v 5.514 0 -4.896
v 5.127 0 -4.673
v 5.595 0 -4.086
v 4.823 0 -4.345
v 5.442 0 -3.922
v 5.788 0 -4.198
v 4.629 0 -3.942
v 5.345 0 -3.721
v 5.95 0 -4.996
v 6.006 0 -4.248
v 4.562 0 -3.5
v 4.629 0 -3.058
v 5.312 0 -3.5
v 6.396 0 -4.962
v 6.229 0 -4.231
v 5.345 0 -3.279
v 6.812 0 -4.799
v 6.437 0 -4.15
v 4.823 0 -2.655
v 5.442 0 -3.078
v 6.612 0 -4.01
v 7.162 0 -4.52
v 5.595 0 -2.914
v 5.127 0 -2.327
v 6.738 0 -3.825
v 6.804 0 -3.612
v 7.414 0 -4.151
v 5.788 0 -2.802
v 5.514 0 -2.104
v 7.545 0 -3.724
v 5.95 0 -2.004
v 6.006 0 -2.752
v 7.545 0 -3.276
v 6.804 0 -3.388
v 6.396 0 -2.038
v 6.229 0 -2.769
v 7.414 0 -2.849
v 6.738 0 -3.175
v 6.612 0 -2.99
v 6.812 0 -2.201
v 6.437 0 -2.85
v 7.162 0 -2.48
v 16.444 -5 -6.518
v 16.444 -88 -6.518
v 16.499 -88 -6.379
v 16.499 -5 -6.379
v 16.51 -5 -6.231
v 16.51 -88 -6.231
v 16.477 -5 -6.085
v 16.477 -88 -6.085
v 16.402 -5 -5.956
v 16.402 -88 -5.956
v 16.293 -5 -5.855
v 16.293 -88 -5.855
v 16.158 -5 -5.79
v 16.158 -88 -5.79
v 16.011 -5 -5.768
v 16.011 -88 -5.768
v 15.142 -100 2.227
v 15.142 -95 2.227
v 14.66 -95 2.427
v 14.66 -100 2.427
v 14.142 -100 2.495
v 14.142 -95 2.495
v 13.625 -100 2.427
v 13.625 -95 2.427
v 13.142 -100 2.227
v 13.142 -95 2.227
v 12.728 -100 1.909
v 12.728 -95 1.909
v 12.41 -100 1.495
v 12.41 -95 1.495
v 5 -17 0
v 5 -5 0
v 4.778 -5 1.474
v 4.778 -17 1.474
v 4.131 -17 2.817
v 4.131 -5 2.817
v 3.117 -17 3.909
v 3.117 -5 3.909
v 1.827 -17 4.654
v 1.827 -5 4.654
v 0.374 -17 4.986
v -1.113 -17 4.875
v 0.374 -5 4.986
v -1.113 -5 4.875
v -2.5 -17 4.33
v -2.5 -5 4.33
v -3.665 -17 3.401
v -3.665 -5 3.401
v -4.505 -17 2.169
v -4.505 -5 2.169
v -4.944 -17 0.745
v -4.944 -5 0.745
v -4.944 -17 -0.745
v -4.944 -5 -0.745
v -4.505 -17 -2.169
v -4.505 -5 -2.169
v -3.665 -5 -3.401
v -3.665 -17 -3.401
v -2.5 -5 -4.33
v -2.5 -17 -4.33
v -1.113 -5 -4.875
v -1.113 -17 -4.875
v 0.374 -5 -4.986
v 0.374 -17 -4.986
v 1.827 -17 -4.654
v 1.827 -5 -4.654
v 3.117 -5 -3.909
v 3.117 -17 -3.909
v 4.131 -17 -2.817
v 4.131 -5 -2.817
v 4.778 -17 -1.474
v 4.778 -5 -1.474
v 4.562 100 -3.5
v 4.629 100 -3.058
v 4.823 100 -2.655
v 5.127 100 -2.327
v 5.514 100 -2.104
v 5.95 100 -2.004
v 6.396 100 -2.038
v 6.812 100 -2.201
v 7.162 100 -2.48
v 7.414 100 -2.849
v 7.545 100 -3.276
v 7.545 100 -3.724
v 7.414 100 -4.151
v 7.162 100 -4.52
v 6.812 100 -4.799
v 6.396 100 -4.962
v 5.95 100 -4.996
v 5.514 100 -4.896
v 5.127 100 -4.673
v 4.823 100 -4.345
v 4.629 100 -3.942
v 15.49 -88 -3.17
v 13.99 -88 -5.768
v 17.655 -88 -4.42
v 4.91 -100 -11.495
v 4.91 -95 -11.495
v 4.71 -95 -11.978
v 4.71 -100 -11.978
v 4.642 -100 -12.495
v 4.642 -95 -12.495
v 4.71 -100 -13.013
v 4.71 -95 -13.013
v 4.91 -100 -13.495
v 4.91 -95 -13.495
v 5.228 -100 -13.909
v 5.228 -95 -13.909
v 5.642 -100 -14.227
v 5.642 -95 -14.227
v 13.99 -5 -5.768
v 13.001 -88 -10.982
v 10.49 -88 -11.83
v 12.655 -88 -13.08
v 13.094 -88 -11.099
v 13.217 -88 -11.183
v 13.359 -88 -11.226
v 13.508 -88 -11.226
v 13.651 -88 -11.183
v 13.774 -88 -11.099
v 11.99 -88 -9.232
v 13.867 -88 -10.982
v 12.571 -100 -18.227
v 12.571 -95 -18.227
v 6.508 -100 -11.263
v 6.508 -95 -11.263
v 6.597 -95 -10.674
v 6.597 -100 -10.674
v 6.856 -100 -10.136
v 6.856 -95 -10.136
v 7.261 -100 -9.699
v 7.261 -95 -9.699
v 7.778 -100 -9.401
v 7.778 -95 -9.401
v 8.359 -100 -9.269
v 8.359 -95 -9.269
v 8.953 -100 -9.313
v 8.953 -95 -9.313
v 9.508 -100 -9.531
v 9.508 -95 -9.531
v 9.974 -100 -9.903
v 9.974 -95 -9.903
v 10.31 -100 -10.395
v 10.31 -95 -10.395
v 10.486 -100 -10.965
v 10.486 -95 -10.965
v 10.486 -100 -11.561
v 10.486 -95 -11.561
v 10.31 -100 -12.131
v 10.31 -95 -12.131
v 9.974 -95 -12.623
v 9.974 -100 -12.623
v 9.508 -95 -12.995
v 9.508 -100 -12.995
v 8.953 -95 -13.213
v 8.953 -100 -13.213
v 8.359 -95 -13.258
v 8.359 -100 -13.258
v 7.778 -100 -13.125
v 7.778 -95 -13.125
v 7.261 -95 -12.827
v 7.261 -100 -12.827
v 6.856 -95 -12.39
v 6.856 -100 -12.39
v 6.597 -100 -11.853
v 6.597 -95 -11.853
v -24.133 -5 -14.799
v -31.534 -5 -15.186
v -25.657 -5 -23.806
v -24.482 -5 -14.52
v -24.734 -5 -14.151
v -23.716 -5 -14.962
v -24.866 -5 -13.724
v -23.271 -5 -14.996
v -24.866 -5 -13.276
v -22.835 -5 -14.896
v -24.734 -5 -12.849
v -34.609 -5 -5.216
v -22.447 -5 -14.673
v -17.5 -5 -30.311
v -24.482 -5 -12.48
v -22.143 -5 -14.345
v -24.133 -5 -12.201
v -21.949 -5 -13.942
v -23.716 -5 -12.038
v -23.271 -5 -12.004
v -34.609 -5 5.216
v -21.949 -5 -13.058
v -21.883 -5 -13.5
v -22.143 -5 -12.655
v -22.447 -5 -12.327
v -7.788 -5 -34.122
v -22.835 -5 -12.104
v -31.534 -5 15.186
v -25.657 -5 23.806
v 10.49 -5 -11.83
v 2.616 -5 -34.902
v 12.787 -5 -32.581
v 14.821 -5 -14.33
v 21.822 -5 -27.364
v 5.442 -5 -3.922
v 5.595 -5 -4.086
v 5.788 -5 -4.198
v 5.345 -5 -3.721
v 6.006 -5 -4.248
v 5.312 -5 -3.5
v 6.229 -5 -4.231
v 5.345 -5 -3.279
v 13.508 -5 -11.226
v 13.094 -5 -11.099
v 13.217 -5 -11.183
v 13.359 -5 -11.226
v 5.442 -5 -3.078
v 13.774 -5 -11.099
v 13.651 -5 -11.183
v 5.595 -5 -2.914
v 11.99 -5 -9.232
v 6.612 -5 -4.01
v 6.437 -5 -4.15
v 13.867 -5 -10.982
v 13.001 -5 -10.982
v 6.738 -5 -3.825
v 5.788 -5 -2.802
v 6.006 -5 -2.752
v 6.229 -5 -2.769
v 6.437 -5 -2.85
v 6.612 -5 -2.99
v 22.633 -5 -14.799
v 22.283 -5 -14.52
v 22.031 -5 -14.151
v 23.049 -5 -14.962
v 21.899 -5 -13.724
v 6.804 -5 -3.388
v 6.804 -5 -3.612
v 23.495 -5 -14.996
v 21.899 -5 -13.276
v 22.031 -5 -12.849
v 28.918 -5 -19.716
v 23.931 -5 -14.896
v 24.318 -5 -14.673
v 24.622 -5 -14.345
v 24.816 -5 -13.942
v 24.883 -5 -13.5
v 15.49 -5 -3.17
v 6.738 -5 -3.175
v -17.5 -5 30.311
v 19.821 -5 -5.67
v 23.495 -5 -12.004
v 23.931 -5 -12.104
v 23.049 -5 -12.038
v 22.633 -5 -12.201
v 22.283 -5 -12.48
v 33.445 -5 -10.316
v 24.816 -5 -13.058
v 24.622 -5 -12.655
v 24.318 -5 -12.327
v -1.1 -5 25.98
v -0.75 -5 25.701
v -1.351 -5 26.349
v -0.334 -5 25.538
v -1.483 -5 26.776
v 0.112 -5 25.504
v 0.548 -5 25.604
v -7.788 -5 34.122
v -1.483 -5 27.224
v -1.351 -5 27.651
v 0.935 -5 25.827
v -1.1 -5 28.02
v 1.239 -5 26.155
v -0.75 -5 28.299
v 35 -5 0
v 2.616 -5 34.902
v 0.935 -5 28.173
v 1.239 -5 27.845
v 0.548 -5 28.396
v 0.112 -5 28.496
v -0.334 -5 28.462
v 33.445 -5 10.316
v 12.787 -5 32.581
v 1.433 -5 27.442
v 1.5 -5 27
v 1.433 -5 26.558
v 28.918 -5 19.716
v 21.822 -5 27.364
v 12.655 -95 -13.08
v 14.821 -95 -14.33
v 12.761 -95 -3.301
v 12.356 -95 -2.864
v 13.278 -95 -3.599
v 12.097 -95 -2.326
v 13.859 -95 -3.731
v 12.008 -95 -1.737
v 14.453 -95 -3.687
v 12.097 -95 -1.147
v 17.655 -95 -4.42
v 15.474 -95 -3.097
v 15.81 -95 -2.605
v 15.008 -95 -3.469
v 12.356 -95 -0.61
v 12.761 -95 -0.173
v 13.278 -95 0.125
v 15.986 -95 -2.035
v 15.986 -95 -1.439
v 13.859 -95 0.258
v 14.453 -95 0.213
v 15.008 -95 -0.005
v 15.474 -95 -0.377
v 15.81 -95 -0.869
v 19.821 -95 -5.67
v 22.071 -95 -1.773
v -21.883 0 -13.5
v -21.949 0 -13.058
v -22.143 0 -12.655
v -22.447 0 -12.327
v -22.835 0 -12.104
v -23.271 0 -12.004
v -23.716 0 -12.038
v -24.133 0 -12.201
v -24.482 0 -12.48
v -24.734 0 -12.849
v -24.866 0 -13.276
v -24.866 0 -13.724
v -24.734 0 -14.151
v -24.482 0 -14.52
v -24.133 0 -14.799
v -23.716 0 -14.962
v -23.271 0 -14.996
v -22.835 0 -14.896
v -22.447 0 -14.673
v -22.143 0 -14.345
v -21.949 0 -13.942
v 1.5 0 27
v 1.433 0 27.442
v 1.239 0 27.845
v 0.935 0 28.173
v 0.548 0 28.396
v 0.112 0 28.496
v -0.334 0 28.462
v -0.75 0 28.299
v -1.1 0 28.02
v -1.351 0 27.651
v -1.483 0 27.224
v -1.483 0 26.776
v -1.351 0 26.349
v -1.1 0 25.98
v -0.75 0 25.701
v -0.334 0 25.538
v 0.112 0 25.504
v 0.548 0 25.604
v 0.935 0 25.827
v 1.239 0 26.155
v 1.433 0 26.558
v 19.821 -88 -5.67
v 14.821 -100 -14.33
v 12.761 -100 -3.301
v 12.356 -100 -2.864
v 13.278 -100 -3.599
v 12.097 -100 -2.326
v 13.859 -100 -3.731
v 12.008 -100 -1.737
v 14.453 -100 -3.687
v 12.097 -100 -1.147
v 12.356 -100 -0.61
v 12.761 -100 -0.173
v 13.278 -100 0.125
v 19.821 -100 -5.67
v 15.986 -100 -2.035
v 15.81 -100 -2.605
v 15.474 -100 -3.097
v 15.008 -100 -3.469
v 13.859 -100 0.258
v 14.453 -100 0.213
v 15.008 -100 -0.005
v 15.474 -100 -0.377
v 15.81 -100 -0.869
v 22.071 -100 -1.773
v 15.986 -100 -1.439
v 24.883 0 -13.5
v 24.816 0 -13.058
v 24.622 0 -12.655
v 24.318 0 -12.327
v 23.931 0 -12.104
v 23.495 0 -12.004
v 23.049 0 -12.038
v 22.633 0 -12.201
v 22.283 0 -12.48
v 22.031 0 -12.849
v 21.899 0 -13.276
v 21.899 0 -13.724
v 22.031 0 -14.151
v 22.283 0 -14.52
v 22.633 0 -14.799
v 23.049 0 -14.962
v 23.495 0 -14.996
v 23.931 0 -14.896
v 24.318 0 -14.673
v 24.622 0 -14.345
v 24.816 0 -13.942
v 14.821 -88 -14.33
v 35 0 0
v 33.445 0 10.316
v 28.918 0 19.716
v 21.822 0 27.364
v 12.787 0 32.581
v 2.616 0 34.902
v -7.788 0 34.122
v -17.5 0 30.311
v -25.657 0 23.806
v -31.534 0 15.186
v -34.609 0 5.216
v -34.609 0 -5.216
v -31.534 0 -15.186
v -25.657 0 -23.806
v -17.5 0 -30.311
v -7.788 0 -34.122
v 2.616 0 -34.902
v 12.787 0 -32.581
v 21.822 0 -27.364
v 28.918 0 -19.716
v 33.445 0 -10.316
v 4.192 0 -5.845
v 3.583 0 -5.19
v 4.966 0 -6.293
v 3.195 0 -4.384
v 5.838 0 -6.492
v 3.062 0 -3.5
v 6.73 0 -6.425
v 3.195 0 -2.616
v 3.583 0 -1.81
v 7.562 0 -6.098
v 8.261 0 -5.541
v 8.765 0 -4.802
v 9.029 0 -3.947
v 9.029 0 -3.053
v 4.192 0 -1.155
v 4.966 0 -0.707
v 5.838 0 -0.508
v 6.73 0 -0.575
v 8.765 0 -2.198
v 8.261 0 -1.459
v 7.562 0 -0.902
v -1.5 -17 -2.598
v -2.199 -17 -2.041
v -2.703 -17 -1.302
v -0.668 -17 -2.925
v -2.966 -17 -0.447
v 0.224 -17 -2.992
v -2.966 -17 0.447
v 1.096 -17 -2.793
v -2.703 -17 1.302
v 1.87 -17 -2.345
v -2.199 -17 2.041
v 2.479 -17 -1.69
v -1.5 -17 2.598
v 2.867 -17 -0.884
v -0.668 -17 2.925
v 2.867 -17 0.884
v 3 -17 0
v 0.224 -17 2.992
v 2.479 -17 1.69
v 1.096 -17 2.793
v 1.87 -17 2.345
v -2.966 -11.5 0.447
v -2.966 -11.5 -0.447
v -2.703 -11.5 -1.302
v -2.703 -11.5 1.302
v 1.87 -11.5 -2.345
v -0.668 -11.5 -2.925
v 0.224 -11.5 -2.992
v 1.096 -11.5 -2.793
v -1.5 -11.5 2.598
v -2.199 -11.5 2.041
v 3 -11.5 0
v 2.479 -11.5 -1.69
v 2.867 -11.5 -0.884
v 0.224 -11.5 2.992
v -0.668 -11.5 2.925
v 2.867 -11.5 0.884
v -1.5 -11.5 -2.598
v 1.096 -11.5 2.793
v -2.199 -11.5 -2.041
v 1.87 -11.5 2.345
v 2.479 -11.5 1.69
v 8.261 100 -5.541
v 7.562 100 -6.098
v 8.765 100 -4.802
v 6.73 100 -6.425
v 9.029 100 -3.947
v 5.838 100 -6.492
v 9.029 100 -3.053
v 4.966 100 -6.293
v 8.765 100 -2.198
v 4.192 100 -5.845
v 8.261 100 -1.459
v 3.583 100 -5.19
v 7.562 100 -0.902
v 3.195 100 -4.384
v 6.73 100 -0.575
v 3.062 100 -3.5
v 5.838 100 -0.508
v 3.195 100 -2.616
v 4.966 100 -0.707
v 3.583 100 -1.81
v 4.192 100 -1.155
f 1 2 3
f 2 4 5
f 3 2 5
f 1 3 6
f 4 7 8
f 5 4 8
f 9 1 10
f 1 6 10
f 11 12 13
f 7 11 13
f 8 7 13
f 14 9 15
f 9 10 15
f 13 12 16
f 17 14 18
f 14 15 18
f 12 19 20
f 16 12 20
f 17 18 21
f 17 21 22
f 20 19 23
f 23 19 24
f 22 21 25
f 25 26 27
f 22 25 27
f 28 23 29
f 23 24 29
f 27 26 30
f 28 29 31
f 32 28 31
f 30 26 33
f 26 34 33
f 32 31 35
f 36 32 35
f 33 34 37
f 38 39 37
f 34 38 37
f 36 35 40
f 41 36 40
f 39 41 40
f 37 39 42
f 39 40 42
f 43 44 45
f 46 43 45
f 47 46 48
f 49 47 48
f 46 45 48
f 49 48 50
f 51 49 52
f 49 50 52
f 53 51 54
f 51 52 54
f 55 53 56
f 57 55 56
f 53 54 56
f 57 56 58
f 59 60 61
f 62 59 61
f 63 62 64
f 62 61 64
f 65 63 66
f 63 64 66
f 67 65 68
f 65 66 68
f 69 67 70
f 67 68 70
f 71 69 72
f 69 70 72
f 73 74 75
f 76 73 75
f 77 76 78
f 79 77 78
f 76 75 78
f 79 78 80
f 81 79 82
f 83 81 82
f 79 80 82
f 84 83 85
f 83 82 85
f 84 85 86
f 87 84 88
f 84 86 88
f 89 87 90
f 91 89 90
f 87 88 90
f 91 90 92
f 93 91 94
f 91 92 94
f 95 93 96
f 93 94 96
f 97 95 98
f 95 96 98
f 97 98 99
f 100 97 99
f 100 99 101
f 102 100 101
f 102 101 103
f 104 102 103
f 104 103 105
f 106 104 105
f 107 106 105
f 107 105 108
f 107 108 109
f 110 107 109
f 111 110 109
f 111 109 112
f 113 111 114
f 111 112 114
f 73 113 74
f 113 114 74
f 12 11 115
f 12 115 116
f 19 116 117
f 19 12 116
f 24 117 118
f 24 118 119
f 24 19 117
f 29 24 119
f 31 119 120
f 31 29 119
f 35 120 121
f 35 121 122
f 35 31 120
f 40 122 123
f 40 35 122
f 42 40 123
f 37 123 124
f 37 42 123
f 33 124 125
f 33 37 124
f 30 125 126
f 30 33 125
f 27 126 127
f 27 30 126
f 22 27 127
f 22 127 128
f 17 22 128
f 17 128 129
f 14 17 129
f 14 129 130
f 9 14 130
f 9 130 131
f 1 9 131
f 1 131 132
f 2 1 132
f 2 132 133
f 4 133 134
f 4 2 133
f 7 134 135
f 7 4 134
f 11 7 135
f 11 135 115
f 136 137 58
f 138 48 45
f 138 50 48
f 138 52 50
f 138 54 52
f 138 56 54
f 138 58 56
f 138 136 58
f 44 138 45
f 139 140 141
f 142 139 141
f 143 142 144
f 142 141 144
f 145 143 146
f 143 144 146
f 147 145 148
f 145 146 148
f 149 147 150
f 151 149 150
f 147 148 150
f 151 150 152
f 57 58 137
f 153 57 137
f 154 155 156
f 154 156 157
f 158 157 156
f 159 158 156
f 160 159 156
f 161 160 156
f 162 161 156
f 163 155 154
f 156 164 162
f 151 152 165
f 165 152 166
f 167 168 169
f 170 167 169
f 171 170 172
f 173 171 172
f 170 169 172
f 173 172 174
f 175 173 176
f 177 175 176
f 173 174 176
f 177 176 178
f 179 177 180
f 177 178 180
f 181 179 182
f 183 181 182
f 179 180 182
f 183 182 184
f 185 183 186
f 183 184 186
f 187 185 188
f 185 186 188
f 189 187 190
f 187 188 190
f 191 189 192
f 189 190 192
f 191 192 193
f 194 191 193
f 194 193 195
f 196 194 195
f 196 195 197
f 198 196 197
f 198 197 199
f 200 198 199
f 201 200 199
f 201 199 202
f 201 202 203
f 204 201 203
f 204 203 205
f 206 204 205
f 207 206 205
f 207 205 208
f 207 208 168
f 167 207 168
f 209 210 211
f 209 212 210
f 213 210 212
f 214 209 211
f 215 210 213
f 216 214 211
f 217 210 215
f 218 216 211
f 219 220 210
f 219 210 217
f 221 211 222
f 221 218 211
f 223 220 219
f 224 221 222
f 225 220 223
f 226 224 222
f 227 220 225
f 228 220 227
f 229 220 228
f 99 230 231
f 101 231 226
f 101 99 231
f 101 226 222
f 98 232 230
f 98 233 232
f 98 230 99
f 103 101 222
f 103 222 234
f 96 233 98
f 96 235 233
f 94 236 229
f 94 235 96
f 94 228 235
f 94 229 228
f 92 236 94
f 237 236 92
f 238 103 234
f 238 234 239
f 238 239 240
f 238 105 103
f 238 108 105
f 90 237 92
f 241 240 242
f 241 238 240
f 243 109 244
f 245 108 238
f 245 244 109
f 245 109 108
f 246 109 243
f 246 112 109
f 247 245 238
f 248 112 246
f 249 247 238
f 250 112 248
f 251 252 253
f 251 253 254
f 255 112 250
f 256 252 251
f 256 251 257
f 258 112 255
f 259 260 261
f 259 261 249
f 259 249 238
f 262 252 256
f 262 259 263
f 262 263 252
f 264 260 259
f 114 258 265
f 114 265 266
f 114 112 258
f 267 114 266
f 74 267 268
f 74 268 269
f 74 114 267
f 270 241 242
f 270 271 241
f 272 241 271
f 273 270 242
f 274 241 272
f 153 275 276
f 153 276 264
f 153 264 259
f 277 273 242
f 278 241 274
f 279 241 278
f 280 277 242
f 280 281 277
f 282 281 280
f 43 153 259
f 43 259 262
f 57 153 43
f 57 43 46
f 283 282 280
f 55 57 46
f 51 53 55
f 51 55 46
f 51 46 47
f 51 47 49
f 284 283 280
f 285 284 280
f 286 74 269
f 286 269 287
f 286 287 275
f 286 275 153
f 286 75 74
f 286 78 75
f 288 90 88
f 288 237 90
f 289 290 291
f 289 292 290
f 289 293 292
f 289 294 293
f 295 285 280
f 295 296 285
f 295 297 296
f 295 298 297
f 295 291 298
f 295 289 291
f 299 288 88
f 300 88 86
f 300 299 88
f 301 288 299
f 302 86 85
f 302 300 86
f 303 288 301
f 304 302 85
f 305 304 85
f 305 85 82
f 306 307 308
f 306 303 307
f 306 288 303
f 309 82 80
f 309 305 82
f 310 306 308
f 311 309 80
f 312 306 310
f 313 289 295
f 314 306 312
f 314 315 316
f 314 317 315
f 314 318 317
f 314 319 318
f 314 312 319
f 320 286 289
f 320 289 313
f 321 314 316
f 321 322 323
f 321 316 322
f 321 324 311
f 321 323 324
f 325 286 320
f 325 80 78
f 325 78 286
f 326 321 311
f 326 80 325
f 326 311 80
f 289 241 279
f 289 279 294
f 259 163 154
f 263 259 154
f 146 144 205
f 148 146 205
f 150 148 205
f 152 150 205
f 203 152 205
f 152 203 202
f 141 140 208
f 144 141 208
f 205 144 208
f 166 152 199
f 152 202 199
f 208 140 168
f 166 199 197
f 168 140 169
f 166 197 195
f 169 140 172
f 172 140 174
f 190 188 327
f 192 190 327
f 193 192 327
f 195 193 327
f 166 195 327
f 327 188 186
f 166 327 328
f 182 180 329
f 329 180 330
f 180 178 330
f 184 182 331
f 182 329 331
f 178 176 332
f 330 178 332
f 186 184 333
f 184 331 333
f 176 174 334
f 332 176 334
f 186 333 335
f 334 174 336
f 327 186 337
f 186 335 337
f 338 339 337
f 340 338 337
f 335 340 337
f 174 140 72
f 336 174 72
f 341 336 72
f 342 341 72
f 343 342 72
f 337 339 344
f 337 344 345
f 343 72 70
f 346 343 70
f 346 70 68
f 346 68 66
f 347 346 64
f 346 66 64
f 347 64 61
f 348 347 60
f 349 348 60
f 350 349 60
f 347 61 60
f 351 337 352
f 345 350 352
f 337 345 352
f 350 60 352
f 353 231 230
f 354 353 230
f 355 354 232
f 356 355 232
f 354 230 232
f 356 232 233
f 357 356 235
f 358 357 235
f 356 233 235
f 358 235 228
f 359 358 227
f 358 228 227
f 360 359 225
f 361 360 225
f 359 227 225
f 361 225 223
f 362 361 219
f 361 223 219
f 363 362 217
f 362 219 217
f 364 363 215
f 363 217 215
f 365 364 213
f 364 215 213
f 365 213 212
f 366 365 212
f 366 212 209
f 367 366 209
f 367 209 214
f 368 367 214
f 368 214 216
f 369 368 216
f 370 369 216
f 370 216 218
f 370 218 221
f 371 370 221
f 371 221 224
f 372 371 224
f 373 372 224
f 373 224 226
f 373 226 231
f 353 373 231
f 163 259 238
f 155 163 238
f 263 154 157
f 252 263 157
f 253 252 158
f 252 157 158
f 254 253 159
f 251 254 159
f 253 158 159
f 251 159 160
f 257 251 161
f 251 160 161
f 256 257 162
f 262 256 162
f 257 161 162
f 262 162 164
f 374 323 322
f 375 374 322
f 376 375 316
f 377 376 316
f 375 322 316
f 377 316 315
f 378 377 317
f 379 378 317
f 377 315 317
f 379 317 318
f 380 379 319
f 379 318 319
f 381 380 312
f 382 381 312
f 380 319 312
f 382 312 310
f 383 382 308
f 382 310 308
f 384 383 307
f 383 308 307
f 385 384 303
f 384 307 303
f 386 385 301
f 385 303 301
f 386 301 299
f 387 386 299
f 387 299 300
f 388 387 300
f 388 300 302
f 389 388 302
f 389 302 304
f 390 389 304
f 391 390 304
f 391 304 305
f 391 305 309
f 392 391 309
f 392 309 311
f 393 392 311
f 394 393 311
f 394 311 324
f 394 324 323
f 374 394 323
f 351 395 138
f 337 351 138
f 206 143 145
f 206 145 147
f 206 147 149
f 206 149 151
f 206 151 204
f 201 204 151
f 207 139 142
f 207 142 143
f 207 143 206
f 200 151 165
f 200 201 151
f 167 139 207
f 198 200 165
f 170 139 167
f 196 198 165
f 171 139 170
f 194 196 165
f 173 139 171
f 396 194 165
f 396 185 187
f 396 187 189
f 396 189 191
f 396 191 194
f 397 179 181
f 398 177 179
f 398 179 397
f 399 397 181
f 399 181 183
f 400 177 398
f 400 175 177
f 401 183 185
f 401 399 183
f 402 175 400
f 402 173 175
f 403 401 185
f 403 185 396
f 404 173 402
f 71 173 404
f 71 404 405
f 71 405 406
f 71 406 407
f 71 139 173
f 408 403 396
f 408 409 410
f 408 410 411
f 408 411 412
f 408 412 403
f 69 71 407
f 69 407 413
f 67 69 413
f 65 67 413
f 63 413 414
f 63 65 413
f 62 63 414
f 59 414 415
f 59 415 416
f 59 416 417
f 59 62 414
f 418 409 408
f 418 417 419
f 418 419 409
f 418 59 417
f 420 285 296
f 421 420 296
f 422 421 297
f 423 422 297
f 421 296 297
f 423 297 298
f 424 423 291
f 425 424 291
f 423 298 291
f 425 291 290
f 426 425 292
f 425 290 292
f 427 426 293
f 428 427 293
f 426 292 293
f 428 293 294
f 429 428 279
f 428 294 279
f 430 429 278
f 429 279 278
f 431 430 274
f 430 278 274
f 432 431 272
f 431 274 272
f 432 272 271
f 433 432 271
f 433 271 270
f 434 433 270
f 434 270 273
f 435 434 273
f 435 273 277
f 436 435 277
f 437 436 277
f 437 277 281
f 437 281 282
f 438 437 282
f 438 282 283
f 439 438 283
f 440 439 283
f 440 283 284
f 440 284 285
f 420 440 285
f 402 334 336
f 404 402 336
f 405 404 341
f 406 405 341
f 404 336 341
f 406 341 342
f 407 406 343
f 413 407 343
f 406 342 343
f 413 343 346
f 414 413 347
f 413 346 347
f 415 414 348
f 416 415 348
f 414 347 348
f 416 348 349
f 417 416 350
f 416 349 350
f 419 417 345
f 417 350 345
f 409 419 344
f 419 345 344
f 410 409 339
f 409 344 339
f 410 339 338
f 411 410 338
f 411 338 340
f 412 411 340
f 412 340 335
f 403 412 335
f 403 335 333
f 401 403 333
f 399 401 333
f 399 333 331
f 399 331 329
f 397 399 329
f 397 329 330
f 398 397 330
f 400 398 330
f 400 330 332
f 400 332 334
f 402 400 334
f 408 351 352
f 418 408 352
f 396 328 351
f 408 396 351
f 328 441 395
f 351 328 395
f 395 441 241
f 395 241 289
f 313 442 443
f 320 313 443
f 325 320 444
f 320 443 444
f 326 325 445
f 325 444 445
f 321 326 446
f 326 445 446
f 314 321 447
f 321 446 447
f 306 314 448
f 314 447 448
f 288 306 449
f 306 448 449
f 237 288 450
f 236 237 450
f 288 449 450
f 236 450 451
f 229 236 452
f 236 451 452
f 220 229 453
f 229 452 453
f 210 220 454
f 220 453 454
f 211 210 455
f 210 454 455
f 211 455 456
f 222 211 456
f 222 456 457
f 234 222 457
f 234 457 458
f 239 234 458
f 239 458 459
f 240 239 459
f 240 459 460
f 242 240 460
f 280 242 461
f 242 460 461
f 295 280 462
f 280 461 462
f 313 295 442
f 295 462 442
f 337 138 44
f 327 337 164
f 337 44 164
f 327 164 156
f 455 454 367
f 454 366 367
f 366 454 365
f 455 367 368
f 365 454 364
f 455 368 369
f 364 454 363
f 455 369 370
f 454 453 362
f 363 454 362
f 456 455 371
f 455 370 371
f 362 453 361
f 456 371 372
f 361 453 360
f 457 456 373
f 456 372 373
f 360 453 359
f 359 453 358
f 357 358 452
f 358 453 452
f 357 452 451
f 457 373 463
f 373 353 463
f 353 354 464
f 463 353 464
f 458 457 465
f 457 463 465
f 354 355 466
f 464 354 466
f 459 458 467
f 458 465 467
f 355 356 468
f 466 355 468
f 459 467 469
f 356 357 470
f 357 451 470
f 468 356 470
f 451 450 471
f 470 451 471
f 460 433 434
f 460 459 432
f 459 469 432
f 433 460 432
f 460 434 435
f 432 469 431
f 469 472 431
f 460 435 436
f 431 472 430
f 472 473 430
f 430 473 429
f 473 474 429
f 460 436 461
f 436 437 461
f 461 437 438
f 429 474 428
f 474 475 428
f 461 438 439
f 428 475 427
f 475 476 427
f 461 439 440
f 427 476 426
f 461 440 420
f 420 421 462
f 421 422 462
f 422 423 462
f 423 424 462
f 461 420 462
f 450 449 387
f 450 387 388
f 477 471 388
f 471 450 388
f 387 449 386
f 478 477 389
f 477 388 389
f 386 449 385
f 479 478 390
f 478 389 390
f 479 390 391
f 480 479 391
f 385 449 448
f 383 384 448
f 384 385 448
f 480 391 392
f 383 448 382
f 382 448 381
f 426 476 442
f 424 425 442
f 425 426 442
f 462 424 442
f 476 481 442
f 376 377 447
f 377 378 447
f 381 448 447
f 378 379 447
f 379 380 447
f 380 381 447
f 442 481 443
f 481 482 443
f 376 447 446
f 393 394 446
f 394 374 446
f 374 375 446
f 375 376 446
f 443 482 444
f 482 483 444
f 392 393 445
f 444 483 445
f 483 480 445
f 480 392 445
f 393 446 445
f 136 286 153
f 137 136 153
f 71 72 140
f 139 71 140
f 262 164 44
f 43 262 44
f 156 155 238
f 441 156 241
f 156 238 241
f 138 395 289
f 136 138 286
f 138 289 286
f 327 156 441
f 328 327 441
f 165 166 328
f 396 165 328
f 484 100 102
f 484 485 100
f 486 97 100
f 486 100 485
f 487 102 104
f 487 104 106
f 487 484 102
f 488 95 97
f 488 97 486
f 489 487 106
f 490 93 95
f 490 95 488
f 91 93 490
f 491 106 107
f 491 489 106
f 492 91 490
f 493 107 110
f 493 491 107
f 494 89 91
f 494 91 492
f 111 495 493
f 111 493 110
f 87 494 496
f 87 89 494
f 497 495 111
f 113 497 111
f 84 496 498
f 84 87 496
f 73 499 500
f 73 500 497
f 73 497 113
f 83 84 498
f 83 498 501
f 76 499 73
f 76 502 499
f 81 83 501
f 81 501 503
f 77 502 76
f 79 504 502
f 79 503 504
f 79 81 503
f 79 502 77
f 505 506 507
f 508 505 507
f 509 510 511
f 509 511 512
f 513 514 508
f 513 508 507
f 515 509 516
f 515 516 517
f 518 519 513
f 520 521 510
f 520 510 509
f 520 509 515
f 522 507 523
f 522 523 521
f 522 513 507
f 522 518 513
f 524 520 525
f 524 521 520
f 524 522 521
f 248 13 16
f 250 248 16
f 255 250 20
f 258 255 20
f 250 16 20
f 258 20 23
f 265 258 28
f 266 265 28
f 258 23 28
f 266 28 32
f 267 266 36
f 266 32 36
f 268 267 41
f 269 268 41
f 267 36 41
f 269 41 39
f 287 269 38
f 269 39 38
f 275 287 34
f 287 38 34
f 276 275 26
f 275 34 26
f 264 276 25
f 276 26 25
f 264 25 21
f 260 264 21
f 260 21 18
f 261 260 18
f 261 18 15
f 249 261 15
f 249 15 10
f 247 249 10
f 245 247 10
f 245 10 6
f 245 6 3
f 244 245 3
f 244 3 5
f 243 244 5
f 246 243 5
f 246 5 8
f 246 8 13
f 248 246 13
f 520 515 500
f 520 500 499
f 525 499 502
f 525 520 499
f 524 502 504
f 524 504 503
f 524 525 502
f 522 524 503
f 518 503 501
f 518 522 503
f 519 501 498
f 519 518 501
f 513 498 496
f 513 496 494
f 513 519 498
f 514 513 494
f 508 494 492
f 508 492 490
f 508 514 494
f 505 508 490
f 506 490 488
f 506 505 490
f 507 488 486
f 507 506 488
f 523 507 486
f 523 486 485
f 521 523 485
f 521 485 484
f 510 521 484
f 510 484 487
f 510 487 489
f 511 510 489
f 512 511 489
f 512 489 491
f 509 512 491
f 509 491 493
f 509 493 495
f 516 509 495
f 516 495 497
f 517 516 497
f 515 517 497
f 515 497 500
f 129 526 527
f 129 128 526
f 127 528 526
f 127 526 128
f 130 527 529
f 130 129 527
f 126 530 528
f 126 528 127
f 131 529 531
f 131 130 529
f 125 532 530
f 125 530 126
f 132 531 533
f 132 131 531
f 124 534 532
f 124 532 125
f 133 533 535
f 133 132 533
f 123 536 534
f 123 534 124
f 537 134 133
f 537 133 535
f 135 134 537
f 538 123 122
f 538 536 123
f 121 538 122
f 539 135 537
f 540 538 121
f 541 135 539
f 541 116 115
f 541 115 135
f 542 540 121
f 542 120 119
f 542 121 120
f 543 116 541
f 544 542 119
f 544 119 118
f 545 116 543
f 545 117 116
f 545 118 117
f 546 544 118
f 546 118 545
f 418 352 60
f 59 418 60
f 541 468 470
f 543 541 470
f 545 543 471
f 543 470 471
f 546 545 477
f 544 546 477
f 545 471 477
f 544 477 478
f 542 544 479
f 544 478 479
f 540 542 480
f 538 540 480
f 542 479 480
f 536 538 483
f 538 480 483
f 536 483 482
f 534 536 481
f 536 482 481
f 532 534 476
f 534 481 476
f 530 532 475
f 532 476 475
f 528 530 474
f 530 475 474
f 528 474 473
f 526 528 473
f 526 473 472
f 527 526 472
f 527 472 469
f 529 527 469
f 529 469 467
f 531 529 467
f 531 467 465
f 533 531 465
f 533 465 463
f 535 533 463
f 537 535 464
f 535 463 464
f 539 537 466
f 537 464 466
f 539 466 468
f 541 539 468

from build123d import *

# Parameters (mm, degrees)
F0_R      = 35
F1_DEPTH  = 5
F2_R      = 5
F2_R_2    = 3
F3_DEPTH  = 12
F5_DEPTH  = 83
F7_D      = 3
F7_DEPTH  = 6
F7_TIP    = 0.9012909285
F9_DEPTH  = 83
F10_R     = 3
F11_DEPTH = 6.5
F13_DEPTH = 7
F15_DEPTH = 5
F17_D     = 4
F17_DEPTH = 10
F17_TIP   = 1.2017212381
F19_D     = 1.5
F19_DEPTH = 10
F19_TIP   = 0.4506454643
F20_R     = 3
F20_R_2   = 1.5
F21_DEPTH = 100


# Not quite as in the source:
# - a feature names something its author has since deleted; it is built from what else it names


with BuildPart() as f1:
    # F0 (on Front) → F1 (new body)
    with BuildSketch(Plane.XZ):
        Circle(F0_R)
    extrude(amount=F1_DEPTH)

    # F2 (on face) → F3 (join)
    with BuildSketch(Plane.XZ.offset(5)):
        Circle(F2_R)
        Circle(F2_R_2, mode=Mode.SUBTRACT)
    extrude(amount=F3_DEPTH)

    # F4 (on face) → F5 (join)
    with BuildSketch(Plane.XZ.offset(5)):
        Polygon((14.8205080757, -14.3301270189), (19.8205080757, -5.6698729811), (15.4903810568, -3.1698729811), (10.4903810568, -11.8301270189), align=None)
    extrude(amount=F5_DEPTH)

    # F7
    with Locations(Plane(origin=(0, 0, 0), x_dir=(-1, 0, 0), z_dir=(0, 1, 0))):
        with Locations((0, 27), (-23.3826859022, -13.5), (23.3826859022, -13.5)):
            Hole(F7_D / 2, depth=F7_DEPTH)
            with Locations((0, 0, -(F7_DEPTH + F7_TIP / 2))):  # 118° drill point
                Cone(0, F7_D / 2, F7_TIP, mode=Mode.SUBTRACT)

    # F8 (on face) → F9 (cut, through all)
    with BuildSketch(Plane.XZ.offset(88)):
        with BuildLine():
            Line((13.9903810568, -5.7679491924), (11.9903810568, -9.2320508076))
            Line((11.9903810568, -9.2320508076), (13.0007440278, -10.9820508076))
            ThreePointArc((13.0007440278, -10.9820508076), (13.4337567297, -11.2320508076), (13.8667694316, -10.9820508076))
            Line((13.8667694316, -10.9820508076), (16.4441197008, -6.5179491924))
            ThreePointArc((16.4441197008, -6.5179491924), (16.4441197008, -6.0179491924), (16.0111069989, -5.7679491924))
            Line((16.0111069989, -5.7679491924), (13.9903810568, -5.7679491924))
        make_face()
    extrude(amount=-F9_DEPTH, mode=Mode.SUBTRACT)

    # F10 (on face) → F11 (join)
    with BuildSketch(Plane.XZ.offset(5)):
        Circle(F10_R)
    extrude(amount=F11_DEPTH)

    # F12 (on face) → F13 (join)
    with BuildSketch(Plane.XZ.offset(88)):
        Polygon((12.6554445662, -13.0801270189), (14.8205080757, -14.3301270189), (19.8205080757, -5.6698729811), (17.6554445662, -4.4198729811), align=None)
    extrude(amount=F13_DEPTH)

    # F14 (on face) → F15 (join)
    with BuildSketch(Plane.XZ.offset(95)):
        with BuildLine():
            Line((5.6423048454, -14.227241336), (12.5705080757, -18.227241336))
            Line((12.5705080757, -18.227241336), (14.8205080757, -14.3301270189))
            Line((14.8205080757, -14.3301270189), (12.6554445662, -13.0801270189))
            Line((12.6554445662, -13.0801270189), (17.6554445662, -4.4198729811))
            Line((17.6554445662, -4.4198729811), (19.8205080757, -5.6698729811))
            Line((19.8205080757, -5.6698729811), (22.0705080757, -1.772758664))
            Line((22.0705080757, -1.772758664), (15.1423048454, 2.227241336))
            ThreePointArc((15.1423048454, 2.227241336), (13.6246667552, 2.427042181), (12.4102540378, 1.4951905284))
            Line((12.4102540378, 1.4951905284), (4.9102540378, -11.4951905284))
            ThreePointArc((4.9102540378, -11.4951905284), (4.7104531928, -13.0128286186), (5.6423048454, -14.227241336))
        make_face()
        Polygon((12.6554445662, -13.0801270189), (14.8205080757, -14.3301270189), (19.8205080757, -5.6698729811), (17.6554445662, -4.4198729811), align=None)
    extrude(amount=F15_DEPTH)

    # F17
    with Locations(Plane.XZ.offset(100)):
        with Locations((14.0083302492, -1.7368602792), (8.5083302492, -11.2631397208)):
            Hole(F17_D / 2, depth=F17_DEPTH)
            with Locations((0, 0, -(F17_DEPTH + F17_TIP / 2))):  # 118° drill point
                Cone(0, F17_D / 2, F17_TIP, mode=Mode.SUBTRACT)

    # F19
    with Locations(Plane.XZ.offset(5)):
        with Locations((6.0621778265, -3.5)):
            Hole(F19_D / 2, depth=F19_DEPTH)
            with Locations((0, 0, -(F19_DEPTH + F19_TIP / 2))):  # 118° drill point
                Cone(0, F19_D / 2, F19_TIP, mode=Mode.SUBTRACT)

    # F20 (on face) → F21 (join)
    with BuildSketch(Plane(origin=(0, 0, 0), x_dir=(-1, 0, 0), z_dir=(0, 1, 0))):
        with Locations((-6.0621778265, -3.5)):
            Circle(F20_R)
        with Locations((-6.0621778265, -3.5)):
            Circle(F20_R_2, mode=Mode.SUBTRACT)
    extrude(amount=F21_DEPTH)


solid = f1.part
